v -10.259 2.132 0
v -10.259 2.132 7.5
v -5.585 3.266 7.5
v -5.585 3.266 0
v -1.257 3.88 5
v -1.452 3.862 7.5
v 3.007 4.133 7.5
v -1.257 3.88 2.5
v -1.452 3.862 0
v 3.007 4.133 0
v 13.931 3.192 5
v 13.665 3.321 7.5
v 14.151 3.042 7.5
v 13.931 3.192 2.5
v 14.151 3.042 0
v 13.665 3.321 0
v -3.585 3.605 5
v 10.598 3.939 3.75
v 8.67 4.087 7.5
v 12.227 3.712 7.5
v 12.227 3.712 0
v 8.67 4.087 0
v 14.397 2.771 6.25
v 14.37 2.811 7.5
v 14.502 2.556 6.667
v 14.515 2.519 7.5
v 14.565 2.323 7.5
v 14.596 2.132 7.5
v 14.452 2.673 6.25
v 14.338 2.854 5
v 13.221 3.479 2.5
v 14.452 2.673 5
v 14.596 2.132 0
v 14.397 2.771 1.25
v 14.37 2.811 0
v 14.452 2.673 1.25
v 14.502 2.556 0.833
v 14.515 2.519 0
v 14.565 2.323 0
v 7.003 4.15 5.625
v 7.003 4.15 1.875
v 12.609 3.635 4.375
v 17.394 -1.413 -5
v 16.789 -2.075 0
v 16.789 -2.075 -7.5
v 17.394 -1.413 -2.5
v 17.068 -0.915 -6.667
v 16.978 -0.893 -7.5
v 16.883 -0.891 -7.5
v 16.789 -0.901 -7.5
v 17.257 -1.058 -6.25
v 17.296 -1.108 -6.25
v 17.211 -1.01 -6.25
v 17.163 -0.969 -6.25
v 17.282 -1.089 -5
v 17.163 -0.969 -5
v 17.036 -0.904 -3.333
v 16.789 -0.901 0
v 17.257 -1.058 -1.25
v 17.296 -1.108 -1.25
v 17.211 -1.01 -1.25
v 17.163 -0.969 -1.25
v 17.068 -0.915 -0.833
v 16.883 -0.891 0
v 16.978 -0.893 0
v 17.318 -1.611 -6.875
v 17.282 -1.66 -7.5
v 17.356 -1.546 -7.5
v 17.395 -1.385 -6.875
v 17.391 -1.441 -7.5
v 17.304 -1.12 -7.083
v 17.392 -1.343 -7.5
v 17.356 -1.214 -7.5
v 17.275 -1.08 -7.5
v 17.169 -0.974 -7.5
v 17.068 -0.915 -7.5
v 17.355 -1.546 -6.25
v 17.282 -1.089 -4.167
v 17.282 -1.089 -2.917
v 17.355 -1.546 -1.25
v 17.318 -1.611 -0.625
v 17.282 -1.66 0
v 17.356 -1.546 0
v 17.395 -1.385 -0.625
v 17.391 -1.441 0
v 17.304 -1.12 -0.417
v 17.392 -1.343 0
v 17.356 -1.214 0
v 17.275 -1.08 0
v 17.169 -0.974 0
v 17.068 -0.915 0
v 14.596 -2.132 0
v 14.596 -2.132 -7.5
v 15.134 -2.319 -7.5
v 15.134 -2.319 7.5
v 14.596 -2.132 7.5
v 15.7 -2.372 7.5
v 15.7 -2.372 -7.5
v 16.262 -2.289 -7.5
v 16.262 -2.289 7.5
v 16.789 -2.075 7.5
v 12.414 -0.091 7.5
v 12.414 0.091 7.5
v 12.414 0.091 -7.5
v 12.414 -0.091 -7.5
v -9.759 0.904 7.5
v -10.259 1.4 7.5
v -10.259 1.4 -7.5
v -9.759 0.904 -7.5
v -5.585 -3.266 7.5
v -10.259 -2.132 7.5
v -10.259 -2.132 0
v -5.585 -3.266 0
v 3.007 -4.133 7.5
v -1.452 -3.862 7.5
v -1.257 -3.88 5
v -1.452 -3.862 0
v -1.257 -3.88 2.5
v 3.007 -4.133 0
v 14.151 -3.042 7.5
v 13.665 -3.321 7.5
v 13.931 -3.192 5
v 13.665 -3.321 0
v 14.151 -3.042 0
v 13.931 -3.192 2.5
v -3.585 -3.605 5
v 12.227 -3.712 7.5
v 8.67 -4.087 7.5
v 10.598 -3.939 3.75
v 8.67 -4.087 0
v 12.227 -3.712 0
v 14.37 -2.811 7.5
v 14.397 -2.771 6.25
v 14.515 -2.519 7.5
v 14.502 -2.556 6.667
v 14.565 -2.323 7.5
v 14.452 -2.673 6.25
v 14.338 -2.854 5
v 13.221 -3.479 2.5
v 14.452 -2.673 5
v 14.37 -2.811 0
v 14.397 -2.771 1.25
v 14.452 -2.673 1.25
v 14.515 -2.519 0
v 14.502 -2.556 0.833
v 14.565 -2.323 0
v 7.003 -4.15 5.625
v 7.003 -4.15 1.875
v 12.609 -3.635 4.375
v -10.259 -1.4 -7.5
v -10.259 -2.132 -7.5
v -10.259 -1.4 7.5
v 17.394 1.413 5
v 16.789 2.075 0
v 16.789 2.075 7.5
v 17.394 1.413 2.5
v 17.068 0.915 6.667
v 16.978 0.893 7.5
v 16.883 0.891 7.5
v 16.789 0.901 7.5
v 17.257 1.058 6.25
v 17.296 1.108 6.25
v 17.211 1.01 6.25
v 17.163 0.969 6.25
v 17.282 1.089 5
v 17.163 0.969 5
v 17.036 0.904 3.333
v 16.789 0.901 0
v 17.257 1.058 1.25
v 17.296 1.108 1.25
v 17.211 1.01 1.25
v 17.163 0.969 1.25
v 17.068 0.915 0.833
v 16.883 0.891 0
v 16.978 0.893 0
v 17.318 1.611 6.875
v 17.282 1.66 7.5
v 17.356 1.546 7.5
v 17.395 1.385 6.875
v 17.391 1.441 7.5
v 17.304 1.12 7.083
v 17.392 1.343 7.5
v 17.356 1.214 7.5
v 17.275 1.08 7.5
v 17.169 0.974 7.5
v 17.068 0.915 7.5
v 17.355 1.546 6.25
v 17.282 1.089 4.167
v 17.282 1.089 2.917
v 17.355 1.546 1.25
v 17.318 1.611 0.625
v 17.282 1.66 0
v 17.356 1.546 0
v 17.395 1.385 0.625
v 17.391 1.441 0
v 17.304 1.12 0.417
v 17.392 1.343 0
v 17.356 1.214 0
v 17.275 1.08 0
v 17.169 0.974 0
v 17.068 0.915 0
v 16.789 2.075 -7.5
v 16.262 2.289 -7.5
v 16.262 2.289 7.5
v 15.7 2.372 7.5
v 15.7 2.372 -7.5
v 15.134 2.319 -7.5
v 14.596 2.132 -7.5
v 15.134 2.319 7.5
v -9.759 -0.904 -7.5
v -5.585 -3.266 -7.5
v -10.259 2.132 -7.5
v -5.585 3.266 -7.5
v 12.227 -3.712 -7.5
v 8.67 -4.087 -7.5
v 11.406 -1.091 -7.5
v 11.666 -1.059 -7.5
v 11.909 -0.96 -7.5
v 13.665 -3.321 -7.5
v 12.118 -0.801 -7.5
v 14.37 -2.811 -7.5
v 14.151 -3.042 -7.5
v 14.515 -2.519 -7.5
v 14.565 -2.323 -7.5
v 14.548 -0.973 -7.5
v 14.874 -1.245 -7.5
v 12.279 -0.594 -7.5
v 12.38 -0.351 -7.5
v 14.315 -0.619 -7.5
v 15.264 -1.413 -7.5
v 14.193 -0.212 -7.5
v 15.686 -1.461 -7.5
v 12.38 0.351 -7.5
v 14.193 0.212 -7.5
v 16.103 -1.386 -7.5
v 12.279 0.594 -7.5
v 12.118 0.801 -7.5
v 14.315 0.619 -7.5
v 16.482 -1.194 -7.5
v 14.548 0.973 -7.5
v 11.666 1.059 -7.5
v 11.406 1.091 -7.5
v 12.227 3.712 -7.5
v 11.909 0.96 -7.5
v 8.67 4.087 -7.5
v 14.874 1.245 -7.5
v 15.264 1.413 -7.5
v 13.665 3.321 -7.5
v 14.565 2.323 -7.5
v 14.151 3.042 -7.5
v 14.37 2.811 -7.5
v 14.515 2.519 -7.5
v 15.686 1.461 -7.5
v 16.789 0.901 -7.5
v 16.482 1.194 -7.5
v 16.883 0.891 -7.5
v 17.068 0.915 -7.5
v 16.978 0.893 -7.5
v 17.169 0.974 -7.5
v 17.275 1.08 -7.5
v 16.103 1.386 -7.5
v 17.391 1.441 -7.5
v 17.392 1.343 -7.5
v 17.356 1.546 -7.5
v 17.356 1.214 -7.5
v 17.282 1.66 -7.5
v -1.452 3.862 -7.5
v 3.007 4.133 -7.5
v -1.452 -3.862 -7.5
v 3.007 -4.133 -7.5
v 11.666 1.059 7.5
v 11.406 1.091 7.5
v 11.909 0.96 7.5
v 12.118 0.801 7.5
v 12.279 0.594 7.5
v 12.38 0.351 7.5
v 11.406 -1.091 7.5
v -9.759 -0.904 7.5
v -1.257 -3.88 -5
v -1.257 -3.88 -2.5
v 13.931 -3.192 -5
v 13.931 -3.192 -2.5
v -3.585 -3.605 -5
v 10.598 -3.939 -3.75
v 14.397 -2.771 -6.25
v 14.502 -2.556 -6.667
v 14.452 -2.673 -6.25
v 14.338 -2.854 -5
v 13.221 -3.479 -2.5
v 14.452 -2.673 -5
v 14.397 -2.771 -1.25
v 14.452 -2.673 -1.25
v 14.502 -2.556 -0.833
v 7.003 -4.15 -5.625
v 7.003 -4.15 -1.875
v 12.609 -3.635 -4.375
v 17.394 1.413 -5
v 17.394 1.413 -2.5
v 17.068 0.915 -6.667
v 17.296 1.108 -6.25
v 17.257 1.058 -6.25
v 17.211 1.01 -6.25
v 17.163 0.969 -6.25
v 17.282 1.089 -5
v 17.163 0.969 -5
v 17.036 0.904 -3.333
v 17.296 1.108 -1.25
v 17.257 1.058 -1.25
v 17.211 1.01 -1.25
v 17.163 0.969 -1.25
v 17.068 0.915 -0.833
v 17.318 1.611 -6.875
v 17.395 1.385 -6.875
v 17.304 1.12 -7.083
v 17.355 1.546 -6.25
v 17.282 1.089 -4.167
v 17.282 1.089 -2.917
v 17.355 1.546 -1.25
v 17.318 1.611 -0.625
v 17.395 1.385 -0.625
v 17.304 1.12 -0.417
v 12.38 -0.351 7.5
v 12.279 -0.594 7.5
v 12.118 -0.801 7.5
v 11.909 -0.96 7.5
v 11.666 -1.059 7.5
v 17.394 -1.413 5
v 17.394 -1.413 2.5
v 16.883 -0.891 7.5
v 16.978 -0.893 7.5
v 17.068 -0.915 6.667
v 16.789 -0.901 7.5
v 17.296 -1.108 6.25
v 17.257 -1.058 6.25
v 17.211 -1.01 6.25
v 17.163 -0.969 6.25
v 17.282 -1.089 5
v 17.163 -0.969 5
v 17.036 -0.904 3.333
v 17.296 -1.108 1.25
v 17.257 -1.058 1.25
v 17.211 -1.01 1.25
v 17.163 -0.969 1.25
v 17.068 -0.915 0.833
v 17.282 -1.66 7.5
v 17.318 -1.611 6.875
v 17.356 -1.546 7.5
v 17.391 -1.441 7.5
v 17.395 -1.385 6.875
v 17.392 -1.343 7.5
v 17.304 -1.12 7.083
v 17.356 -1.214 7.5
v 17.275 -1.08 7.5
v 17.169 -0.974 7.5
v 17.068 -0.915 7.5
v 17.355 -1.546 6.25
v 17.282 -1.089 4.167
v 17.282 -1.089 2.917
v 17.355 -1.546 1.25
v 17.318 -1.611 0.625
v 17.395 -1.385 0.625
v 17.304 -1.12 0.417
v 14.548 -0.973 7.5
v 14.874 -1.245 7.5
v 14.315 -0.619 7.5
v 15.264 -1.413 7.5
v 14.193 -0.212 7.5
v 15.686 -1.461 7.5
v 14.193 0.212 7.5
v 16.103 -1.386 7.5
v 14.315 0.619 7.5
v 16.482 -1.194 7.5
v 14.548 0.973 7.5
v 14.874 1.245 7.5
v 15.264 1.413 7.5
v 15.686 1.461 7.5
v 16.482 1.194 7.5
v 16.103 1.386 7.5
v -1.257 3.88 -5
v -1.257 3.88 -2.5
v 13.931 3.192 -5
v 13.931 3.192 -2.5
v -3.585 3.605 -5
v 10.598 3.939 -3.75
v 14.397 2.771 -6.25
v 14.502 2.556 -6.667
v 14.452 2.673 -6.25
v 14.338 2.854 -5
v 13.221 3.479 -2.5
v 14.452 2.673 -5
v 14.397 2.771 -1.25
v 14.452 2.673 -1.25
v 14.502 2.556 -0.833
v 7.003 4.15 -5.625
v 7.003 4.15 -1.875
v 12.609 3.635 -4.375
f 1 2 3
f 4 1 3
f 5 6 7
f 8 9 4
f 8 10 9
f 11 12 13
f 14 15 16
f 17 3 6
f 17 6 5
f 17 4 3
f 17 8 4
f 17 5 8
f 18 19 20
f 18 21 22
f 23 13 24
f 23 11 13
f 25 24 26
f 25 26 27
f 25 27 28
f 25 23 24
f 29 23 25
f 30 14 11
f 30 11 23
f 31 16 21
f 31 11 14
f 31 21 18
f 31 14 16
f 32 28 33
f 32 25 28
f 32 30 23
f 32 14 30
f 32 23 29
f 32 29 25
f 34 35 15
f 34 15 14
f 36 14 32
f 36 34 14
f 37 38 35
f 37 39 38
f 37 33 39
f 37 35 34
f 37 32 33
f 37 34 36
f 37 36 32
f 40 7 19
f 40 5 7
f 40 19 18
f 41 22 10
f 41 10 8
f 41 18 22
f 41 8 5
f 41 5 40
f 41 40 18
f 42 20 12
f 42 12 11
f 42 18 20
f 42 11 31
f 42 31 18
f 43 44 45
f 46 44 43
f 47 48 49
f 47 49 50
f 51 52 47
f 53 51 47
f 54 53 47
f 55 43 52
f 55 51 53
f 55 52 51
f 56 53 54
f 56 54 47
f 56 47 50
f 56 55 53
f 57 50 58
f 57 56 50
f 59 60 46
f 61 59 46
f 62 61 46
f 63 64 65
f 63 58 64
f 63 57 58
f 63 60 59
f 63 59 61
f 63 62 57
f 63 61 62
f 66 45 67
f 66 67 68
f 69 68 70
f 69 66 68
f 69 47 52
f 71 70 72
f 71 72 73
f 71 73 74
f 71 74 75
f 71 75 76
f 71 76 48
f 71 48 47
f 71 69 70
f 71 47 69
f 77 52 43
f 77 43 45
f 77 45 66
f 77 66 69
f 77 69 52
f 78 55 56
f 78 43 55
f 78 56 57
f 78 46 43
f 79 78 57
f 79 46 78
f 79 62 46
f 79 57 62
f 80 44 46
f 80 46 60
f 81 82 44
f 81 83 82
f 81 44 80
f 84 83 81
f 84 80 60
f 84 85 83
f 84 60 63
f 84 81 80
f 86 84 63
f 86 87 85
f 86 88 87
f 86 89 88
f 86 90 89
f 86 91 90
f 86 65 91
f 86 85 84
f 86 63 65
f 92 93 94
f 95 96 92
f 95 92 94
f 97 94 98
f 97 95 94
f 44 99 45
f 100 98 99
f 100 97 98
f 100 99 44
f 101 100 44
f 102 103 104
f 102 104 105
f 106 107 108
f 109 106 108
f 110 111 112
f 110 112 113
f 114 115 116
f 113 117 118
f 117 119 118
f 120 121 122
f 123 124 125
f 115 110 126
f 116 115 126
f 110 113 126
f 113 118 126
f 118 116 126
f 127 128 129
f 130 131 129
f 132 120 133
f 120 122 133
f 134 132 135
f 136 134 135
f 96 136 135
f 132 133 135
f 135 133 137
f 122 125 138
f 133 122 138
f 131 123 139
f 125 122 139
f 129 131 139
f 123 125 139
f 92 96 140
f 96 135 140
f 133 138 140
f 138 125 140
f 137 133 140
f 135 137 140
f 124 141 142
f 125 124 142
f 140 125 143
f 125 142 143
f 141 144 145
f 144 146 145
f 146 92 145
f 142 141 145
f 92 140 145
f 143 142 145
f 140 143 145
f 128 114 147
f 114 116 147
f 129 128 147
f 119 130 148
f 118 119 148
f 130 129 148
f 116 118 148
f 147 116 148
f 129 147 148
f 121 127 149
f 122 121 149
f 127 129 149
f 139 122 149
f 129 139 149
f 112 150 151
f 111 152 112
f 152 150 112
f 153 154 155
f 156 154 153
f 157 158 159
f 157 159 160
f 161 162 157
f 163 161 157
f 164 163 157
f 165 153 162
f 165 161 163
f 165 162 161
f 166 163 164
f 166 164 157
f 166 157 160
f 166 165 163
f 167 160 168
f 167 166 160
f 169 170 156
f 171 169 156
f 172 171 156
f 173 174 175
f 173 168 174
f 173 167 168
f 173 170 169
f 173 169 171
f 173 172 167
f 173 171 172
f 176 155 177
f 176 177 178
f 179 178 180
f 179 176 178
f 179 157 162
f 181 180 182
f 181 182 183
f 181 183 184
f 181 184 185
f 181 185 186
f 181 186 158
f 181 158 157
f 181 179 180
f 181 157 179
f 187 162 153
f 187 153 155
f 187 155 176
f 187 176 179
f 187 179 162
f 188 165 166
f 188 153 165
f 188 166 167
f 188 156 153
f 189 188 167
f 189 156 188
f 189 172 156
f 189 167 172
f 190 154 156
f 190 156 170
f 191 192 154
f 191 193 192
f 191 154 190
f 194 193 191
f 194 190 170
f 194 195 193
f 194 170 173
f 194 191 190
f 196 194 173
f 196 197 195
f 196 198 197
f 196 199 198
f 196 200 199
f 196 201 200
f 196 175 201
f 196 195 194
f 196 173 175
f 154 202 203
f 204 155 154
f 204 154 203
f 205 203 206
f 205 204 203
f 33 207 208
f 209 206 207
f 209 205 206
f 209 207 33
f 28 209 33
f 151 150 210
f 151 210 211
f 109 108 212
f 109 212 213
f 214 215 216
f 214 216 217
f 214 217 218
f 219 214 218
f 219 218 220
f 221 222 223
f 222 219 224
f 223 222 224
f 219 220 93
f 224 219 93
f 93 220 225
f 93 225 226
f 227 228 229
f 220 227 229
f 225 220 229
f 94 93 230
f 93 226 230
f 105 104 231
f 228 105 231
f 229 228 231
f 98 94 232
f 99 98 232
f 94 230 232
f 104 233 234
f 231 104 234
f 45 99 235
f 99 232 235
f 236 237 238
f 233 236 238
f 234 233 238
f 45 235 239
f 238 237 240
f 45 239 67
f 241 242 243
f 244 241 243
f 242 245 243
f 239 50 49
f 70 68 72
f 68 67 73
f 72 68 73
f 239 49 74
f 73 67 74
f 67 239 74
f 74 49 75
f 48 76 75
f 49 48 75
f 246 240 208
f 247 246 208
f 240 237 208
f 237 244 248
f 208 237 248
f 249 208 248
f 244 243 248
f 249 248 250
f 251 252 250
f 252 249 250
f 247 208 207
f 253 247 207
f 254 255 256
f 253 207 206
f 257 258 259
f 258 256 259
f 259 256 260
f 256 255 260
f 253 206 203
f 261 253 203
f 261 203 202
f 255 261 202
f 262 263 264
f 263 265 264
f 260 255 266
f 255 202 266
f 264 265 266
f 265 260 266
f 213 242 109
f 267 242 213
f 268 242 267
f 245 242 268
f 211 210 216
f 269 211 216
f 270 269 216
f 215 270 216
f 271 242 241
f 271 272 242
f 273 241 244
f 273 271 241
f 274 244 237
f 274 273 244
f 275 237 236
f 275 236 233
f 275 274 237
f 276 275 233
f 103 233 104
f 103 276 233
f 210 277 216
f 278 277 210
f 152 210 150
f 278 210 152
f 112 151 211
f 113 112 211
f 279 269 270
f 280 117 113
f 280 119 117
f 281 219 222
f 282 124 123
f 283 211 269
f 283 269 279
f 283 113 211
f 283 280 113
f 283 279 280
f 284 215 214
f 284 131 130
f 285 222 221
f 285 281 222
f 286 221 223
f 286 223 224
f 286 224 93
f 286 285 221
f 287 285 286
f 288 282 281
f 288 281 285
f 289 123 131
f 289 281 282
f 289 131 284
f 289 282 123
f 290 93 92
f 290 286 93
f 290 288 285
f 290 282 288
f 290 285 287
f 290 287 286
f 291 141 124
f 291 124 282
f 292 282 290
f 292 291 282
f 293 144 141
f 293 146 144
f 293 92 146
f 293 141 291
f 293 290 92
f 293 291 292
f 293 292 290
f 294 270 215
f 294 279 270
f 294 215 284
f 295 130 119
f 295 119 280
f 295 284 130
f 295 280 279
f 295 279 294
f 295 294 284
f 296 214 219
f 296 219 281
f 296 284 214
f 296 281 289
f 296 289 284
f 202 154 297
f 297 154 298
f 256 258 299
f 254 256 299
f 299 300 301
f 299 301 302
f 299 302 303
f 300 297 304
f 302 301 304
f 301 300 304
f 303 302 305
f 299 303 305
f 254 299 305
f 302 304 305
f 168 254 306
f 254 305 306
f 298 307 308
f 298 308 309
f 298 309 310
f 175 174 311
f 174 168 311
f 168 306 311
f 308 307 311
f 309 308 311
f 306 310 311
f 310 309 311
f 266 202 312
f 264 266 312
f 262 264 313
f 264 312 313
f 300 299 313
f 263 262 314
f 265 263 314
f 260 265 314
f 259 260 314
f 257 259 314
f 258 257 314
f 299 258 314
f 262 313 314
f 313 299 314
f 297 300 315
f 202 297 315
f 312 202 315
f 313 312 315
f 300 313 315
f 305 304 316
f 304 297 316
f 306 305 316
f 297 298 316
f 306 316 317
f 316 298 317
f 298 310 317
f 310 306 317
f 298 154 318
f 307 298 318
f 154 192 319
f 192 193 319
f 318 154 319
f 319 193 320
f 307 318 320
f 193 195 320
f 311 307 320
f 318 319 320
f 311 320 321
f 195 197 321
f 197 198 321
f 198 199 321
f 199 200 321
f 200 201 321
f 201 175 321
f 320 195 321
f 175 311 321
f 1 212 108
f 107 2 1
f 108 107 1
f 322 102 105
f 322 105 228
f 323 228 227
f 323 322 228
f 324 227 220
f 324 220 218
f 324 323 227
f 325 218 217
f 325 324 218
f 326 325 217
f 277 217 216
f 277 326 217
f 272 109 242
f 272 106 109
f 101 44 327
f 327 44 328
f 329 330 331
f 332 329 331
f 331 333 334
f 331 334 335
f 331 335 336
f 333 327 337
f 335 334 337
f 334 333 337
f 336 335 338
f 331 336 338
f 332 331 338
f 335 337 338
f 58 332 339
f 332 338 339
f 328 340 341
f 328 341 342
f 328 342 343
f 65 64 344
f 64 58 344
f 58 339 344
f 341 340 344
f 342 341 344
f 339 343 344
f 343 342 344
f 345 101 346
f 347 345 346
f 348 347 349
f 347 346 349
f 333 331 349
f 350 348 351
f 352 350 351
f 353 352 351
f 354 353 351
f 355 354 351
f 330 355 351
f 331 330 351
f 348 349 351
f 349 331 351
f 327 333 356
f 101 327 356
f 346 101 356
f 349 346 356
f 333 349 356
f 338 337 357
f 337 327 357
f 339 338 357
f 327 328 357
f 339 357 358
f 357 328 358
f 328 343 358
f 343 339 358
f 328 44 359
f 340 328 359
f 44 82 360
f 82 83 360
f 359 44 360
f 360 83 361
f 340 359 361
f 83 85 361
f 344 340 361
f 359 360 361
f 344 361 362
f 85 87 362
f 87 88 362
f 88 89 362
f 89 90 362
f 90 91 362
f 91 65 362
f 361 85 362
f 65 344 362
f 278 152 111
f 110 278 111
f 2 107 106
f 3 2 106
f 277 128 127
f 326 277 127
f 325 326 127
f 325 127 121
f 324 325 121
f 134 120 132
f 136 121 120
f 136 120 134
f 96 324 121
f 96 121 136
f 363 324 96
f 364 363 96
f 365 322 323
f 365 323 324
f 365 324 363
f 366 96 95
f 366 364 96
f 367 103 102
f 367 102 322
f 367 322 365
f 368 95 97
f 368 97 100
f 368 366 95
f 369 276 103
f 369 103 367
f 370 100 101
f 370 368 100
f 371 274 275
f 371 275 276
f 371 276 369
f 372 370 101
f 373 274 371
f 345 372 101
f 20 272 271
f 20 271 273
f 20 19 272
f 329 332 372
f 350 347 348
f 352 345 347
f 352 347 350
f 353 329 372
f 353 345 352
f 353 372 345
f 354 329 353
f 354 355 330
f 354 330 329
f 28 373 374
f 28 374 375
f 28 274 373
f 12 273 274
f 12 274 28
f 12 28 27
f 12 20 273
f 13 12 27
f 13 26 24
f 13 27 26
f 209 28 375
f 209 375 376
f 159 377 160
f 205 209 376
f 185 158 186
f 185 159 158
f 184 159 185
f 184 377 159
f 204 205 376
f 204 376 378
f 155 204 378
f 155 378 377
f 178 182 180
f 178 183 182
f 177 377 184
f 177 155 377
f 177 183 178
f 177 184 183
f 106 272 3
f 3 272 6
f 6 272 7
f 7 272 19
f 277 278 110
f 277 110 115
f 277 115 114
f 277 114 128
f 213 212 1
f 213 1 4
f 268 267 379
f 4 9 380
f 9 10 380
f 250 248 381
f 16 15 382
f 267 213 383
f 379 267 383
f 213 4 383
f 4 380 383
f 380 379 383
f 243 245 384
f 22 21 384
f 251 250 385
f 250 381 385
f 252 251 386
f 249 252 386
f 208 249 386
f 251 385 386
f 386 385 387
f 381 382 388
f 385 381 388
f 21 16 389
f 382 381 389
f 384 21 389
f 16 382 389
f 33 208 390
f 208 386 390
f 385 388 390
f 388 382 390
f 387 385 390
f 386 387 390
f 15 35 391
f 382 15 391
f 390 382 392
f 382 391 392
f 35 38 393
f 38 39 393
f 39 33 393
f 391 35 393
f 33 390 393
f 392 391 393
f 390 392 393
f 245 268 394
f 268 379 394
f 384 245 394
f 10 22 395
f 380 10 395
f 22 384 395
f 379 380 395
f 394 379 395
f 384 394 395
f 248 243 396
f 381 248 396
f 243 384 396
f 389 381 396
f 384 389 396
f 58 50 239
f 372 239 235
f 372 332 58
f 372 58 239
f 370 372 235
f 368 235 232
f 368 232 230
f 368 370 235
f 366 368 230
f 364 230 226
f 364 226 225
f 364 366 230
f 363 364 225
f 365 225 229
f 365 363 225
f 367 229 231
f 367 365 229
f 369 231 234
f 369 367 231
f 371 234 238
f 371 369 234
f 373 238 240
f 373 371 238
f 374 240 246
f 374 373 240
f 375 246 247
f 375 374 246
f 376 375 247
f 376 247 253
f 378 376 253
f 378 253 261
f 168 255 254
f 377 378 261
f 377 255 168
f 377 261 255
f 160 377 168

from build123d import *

# Parameters (mm, degrees)
F1_DEPTH = 7.5
F3_DEPTH = 7.5
F4_SIZE  = 0.5


with BuildPart() as f1:
    # F0 (on Top) → F1 (new body, symmetric)
    with BuildSketch(Plane.XY):
        with BuildLine():
            ThreePointArc((16.7892444879, -0.9012567011), (14.177166416, 0), (16.7892444879, 0.9012567011))
            add(Edge.make_bspline(
                [(16.7892444879, 2.0751408301), (17.0817766167, 1.8643906524), (17.6043278119, 1.487926851), (17.1393225295, 0.8569863783), (16.895080973, 0.8878727844), (16.7892444879, 0.9012567011)],
                knots=[0, 0, 0, 0, 0.418834252, 0.7481651325, 1, 1, 1, 1], degree=3))
            ThreePointArc((16.7892444879, 2.0751408301), (13.2649986311, 0), (16.7892444879, -2.0751408301))
            add(Edge.make_bspline(
                [(16.7892444879, -2.0751408301), (17.0817766167, -1.8643906524), (17.6043278119, -1.487926851), (17.1393225295, -0.8569863783), (16.895080973, -0.8878727844), (16.7892444879, -0.9012567011)],
                knots=[0, 0, 0, 0, 0.418834252, 0.7481651325, 1, 1, 1, 1], degree=3))
        make_face()
    extrude(amount=F1_DEPTH, both=True)

    # F2 (on Top) → F3 (join, symmetric)
    with BuildSketch(Plane.XY):
        with BuildLine():
            ThreePointArc((11.4055118786, 1.0911012502), (12.1183137998, 0.8013586402), (12.4143324792, 0.0911401524))
            Line((12.4143324792, 0.0911401524), (12.4143324792, -0.0911401524))
            ThreePointArc((12.4143324792, -0.0911401524), (12.1183137998, -0.8013586402), (11.4055118786, -1.0911012502))
            Line((11.4055118786, -1.0911012502), (-10.2589782327, -0.9))
            Line((-10.2589782327, -0.9), (-10.2589782327, -2.1322260433))
            add(Edge.make_bspline(
                [(-10.2589782327, -2.1322260433), (-7.8308672605, -2.7680444958), (-2.1715241973, -4.4371278226), (14.2840922078, -4.2672083443), (14.5433608635, -2.4774637884), (14.5964084265, -2.1322260433)],
                knots=[0, 0, 0, 0, 0.3763600101, 0.8609680907, 1, 1, 1, 1], degree=3))
            Line((14.5964084265, -2.1322260433), (13.9306001365, -1.5301937237))
            Line((13.9306001365, -1.5301937237), (13.9306001365, 1.5301937237))
            Line((13.9306001365, 1.5301937237), (14.5964084265, 2.1322260433))
            add(Edge.make_bspline(
                [(-10.2589782327, 2.1322260433), (-7.8308672605, 2.7680444958), (-2.1715241973, 4.4371278226), (14.2840922078, 4.2672083443), (14.5433608635, 2.4774637884), (14.5964084265, 2.1322260433)],
                knots=[0, 0, 0, 0, 0.3763600101, 0.8609680907, 1, 1, 1, 1], degree=3))
            Line((-10.2589782327, 2.1322260433), (-10.2589782327, 0.9))
            Line((-10.2589782327, 0.9), (11.4055118786, 1.0911012502))
        make_face()
    extrude(amount=F3_DEPTH, both=True)

    # F4
    f4_edges = [f1.edges().sort_by_distance(p)[0] for p in [
        (-10.258978, -0.9, 0),
        (-10.258978, 0.9, 0),
    ]]
    chamfer(f4_edges, length=F4_SIZE)


solid = f1.part
